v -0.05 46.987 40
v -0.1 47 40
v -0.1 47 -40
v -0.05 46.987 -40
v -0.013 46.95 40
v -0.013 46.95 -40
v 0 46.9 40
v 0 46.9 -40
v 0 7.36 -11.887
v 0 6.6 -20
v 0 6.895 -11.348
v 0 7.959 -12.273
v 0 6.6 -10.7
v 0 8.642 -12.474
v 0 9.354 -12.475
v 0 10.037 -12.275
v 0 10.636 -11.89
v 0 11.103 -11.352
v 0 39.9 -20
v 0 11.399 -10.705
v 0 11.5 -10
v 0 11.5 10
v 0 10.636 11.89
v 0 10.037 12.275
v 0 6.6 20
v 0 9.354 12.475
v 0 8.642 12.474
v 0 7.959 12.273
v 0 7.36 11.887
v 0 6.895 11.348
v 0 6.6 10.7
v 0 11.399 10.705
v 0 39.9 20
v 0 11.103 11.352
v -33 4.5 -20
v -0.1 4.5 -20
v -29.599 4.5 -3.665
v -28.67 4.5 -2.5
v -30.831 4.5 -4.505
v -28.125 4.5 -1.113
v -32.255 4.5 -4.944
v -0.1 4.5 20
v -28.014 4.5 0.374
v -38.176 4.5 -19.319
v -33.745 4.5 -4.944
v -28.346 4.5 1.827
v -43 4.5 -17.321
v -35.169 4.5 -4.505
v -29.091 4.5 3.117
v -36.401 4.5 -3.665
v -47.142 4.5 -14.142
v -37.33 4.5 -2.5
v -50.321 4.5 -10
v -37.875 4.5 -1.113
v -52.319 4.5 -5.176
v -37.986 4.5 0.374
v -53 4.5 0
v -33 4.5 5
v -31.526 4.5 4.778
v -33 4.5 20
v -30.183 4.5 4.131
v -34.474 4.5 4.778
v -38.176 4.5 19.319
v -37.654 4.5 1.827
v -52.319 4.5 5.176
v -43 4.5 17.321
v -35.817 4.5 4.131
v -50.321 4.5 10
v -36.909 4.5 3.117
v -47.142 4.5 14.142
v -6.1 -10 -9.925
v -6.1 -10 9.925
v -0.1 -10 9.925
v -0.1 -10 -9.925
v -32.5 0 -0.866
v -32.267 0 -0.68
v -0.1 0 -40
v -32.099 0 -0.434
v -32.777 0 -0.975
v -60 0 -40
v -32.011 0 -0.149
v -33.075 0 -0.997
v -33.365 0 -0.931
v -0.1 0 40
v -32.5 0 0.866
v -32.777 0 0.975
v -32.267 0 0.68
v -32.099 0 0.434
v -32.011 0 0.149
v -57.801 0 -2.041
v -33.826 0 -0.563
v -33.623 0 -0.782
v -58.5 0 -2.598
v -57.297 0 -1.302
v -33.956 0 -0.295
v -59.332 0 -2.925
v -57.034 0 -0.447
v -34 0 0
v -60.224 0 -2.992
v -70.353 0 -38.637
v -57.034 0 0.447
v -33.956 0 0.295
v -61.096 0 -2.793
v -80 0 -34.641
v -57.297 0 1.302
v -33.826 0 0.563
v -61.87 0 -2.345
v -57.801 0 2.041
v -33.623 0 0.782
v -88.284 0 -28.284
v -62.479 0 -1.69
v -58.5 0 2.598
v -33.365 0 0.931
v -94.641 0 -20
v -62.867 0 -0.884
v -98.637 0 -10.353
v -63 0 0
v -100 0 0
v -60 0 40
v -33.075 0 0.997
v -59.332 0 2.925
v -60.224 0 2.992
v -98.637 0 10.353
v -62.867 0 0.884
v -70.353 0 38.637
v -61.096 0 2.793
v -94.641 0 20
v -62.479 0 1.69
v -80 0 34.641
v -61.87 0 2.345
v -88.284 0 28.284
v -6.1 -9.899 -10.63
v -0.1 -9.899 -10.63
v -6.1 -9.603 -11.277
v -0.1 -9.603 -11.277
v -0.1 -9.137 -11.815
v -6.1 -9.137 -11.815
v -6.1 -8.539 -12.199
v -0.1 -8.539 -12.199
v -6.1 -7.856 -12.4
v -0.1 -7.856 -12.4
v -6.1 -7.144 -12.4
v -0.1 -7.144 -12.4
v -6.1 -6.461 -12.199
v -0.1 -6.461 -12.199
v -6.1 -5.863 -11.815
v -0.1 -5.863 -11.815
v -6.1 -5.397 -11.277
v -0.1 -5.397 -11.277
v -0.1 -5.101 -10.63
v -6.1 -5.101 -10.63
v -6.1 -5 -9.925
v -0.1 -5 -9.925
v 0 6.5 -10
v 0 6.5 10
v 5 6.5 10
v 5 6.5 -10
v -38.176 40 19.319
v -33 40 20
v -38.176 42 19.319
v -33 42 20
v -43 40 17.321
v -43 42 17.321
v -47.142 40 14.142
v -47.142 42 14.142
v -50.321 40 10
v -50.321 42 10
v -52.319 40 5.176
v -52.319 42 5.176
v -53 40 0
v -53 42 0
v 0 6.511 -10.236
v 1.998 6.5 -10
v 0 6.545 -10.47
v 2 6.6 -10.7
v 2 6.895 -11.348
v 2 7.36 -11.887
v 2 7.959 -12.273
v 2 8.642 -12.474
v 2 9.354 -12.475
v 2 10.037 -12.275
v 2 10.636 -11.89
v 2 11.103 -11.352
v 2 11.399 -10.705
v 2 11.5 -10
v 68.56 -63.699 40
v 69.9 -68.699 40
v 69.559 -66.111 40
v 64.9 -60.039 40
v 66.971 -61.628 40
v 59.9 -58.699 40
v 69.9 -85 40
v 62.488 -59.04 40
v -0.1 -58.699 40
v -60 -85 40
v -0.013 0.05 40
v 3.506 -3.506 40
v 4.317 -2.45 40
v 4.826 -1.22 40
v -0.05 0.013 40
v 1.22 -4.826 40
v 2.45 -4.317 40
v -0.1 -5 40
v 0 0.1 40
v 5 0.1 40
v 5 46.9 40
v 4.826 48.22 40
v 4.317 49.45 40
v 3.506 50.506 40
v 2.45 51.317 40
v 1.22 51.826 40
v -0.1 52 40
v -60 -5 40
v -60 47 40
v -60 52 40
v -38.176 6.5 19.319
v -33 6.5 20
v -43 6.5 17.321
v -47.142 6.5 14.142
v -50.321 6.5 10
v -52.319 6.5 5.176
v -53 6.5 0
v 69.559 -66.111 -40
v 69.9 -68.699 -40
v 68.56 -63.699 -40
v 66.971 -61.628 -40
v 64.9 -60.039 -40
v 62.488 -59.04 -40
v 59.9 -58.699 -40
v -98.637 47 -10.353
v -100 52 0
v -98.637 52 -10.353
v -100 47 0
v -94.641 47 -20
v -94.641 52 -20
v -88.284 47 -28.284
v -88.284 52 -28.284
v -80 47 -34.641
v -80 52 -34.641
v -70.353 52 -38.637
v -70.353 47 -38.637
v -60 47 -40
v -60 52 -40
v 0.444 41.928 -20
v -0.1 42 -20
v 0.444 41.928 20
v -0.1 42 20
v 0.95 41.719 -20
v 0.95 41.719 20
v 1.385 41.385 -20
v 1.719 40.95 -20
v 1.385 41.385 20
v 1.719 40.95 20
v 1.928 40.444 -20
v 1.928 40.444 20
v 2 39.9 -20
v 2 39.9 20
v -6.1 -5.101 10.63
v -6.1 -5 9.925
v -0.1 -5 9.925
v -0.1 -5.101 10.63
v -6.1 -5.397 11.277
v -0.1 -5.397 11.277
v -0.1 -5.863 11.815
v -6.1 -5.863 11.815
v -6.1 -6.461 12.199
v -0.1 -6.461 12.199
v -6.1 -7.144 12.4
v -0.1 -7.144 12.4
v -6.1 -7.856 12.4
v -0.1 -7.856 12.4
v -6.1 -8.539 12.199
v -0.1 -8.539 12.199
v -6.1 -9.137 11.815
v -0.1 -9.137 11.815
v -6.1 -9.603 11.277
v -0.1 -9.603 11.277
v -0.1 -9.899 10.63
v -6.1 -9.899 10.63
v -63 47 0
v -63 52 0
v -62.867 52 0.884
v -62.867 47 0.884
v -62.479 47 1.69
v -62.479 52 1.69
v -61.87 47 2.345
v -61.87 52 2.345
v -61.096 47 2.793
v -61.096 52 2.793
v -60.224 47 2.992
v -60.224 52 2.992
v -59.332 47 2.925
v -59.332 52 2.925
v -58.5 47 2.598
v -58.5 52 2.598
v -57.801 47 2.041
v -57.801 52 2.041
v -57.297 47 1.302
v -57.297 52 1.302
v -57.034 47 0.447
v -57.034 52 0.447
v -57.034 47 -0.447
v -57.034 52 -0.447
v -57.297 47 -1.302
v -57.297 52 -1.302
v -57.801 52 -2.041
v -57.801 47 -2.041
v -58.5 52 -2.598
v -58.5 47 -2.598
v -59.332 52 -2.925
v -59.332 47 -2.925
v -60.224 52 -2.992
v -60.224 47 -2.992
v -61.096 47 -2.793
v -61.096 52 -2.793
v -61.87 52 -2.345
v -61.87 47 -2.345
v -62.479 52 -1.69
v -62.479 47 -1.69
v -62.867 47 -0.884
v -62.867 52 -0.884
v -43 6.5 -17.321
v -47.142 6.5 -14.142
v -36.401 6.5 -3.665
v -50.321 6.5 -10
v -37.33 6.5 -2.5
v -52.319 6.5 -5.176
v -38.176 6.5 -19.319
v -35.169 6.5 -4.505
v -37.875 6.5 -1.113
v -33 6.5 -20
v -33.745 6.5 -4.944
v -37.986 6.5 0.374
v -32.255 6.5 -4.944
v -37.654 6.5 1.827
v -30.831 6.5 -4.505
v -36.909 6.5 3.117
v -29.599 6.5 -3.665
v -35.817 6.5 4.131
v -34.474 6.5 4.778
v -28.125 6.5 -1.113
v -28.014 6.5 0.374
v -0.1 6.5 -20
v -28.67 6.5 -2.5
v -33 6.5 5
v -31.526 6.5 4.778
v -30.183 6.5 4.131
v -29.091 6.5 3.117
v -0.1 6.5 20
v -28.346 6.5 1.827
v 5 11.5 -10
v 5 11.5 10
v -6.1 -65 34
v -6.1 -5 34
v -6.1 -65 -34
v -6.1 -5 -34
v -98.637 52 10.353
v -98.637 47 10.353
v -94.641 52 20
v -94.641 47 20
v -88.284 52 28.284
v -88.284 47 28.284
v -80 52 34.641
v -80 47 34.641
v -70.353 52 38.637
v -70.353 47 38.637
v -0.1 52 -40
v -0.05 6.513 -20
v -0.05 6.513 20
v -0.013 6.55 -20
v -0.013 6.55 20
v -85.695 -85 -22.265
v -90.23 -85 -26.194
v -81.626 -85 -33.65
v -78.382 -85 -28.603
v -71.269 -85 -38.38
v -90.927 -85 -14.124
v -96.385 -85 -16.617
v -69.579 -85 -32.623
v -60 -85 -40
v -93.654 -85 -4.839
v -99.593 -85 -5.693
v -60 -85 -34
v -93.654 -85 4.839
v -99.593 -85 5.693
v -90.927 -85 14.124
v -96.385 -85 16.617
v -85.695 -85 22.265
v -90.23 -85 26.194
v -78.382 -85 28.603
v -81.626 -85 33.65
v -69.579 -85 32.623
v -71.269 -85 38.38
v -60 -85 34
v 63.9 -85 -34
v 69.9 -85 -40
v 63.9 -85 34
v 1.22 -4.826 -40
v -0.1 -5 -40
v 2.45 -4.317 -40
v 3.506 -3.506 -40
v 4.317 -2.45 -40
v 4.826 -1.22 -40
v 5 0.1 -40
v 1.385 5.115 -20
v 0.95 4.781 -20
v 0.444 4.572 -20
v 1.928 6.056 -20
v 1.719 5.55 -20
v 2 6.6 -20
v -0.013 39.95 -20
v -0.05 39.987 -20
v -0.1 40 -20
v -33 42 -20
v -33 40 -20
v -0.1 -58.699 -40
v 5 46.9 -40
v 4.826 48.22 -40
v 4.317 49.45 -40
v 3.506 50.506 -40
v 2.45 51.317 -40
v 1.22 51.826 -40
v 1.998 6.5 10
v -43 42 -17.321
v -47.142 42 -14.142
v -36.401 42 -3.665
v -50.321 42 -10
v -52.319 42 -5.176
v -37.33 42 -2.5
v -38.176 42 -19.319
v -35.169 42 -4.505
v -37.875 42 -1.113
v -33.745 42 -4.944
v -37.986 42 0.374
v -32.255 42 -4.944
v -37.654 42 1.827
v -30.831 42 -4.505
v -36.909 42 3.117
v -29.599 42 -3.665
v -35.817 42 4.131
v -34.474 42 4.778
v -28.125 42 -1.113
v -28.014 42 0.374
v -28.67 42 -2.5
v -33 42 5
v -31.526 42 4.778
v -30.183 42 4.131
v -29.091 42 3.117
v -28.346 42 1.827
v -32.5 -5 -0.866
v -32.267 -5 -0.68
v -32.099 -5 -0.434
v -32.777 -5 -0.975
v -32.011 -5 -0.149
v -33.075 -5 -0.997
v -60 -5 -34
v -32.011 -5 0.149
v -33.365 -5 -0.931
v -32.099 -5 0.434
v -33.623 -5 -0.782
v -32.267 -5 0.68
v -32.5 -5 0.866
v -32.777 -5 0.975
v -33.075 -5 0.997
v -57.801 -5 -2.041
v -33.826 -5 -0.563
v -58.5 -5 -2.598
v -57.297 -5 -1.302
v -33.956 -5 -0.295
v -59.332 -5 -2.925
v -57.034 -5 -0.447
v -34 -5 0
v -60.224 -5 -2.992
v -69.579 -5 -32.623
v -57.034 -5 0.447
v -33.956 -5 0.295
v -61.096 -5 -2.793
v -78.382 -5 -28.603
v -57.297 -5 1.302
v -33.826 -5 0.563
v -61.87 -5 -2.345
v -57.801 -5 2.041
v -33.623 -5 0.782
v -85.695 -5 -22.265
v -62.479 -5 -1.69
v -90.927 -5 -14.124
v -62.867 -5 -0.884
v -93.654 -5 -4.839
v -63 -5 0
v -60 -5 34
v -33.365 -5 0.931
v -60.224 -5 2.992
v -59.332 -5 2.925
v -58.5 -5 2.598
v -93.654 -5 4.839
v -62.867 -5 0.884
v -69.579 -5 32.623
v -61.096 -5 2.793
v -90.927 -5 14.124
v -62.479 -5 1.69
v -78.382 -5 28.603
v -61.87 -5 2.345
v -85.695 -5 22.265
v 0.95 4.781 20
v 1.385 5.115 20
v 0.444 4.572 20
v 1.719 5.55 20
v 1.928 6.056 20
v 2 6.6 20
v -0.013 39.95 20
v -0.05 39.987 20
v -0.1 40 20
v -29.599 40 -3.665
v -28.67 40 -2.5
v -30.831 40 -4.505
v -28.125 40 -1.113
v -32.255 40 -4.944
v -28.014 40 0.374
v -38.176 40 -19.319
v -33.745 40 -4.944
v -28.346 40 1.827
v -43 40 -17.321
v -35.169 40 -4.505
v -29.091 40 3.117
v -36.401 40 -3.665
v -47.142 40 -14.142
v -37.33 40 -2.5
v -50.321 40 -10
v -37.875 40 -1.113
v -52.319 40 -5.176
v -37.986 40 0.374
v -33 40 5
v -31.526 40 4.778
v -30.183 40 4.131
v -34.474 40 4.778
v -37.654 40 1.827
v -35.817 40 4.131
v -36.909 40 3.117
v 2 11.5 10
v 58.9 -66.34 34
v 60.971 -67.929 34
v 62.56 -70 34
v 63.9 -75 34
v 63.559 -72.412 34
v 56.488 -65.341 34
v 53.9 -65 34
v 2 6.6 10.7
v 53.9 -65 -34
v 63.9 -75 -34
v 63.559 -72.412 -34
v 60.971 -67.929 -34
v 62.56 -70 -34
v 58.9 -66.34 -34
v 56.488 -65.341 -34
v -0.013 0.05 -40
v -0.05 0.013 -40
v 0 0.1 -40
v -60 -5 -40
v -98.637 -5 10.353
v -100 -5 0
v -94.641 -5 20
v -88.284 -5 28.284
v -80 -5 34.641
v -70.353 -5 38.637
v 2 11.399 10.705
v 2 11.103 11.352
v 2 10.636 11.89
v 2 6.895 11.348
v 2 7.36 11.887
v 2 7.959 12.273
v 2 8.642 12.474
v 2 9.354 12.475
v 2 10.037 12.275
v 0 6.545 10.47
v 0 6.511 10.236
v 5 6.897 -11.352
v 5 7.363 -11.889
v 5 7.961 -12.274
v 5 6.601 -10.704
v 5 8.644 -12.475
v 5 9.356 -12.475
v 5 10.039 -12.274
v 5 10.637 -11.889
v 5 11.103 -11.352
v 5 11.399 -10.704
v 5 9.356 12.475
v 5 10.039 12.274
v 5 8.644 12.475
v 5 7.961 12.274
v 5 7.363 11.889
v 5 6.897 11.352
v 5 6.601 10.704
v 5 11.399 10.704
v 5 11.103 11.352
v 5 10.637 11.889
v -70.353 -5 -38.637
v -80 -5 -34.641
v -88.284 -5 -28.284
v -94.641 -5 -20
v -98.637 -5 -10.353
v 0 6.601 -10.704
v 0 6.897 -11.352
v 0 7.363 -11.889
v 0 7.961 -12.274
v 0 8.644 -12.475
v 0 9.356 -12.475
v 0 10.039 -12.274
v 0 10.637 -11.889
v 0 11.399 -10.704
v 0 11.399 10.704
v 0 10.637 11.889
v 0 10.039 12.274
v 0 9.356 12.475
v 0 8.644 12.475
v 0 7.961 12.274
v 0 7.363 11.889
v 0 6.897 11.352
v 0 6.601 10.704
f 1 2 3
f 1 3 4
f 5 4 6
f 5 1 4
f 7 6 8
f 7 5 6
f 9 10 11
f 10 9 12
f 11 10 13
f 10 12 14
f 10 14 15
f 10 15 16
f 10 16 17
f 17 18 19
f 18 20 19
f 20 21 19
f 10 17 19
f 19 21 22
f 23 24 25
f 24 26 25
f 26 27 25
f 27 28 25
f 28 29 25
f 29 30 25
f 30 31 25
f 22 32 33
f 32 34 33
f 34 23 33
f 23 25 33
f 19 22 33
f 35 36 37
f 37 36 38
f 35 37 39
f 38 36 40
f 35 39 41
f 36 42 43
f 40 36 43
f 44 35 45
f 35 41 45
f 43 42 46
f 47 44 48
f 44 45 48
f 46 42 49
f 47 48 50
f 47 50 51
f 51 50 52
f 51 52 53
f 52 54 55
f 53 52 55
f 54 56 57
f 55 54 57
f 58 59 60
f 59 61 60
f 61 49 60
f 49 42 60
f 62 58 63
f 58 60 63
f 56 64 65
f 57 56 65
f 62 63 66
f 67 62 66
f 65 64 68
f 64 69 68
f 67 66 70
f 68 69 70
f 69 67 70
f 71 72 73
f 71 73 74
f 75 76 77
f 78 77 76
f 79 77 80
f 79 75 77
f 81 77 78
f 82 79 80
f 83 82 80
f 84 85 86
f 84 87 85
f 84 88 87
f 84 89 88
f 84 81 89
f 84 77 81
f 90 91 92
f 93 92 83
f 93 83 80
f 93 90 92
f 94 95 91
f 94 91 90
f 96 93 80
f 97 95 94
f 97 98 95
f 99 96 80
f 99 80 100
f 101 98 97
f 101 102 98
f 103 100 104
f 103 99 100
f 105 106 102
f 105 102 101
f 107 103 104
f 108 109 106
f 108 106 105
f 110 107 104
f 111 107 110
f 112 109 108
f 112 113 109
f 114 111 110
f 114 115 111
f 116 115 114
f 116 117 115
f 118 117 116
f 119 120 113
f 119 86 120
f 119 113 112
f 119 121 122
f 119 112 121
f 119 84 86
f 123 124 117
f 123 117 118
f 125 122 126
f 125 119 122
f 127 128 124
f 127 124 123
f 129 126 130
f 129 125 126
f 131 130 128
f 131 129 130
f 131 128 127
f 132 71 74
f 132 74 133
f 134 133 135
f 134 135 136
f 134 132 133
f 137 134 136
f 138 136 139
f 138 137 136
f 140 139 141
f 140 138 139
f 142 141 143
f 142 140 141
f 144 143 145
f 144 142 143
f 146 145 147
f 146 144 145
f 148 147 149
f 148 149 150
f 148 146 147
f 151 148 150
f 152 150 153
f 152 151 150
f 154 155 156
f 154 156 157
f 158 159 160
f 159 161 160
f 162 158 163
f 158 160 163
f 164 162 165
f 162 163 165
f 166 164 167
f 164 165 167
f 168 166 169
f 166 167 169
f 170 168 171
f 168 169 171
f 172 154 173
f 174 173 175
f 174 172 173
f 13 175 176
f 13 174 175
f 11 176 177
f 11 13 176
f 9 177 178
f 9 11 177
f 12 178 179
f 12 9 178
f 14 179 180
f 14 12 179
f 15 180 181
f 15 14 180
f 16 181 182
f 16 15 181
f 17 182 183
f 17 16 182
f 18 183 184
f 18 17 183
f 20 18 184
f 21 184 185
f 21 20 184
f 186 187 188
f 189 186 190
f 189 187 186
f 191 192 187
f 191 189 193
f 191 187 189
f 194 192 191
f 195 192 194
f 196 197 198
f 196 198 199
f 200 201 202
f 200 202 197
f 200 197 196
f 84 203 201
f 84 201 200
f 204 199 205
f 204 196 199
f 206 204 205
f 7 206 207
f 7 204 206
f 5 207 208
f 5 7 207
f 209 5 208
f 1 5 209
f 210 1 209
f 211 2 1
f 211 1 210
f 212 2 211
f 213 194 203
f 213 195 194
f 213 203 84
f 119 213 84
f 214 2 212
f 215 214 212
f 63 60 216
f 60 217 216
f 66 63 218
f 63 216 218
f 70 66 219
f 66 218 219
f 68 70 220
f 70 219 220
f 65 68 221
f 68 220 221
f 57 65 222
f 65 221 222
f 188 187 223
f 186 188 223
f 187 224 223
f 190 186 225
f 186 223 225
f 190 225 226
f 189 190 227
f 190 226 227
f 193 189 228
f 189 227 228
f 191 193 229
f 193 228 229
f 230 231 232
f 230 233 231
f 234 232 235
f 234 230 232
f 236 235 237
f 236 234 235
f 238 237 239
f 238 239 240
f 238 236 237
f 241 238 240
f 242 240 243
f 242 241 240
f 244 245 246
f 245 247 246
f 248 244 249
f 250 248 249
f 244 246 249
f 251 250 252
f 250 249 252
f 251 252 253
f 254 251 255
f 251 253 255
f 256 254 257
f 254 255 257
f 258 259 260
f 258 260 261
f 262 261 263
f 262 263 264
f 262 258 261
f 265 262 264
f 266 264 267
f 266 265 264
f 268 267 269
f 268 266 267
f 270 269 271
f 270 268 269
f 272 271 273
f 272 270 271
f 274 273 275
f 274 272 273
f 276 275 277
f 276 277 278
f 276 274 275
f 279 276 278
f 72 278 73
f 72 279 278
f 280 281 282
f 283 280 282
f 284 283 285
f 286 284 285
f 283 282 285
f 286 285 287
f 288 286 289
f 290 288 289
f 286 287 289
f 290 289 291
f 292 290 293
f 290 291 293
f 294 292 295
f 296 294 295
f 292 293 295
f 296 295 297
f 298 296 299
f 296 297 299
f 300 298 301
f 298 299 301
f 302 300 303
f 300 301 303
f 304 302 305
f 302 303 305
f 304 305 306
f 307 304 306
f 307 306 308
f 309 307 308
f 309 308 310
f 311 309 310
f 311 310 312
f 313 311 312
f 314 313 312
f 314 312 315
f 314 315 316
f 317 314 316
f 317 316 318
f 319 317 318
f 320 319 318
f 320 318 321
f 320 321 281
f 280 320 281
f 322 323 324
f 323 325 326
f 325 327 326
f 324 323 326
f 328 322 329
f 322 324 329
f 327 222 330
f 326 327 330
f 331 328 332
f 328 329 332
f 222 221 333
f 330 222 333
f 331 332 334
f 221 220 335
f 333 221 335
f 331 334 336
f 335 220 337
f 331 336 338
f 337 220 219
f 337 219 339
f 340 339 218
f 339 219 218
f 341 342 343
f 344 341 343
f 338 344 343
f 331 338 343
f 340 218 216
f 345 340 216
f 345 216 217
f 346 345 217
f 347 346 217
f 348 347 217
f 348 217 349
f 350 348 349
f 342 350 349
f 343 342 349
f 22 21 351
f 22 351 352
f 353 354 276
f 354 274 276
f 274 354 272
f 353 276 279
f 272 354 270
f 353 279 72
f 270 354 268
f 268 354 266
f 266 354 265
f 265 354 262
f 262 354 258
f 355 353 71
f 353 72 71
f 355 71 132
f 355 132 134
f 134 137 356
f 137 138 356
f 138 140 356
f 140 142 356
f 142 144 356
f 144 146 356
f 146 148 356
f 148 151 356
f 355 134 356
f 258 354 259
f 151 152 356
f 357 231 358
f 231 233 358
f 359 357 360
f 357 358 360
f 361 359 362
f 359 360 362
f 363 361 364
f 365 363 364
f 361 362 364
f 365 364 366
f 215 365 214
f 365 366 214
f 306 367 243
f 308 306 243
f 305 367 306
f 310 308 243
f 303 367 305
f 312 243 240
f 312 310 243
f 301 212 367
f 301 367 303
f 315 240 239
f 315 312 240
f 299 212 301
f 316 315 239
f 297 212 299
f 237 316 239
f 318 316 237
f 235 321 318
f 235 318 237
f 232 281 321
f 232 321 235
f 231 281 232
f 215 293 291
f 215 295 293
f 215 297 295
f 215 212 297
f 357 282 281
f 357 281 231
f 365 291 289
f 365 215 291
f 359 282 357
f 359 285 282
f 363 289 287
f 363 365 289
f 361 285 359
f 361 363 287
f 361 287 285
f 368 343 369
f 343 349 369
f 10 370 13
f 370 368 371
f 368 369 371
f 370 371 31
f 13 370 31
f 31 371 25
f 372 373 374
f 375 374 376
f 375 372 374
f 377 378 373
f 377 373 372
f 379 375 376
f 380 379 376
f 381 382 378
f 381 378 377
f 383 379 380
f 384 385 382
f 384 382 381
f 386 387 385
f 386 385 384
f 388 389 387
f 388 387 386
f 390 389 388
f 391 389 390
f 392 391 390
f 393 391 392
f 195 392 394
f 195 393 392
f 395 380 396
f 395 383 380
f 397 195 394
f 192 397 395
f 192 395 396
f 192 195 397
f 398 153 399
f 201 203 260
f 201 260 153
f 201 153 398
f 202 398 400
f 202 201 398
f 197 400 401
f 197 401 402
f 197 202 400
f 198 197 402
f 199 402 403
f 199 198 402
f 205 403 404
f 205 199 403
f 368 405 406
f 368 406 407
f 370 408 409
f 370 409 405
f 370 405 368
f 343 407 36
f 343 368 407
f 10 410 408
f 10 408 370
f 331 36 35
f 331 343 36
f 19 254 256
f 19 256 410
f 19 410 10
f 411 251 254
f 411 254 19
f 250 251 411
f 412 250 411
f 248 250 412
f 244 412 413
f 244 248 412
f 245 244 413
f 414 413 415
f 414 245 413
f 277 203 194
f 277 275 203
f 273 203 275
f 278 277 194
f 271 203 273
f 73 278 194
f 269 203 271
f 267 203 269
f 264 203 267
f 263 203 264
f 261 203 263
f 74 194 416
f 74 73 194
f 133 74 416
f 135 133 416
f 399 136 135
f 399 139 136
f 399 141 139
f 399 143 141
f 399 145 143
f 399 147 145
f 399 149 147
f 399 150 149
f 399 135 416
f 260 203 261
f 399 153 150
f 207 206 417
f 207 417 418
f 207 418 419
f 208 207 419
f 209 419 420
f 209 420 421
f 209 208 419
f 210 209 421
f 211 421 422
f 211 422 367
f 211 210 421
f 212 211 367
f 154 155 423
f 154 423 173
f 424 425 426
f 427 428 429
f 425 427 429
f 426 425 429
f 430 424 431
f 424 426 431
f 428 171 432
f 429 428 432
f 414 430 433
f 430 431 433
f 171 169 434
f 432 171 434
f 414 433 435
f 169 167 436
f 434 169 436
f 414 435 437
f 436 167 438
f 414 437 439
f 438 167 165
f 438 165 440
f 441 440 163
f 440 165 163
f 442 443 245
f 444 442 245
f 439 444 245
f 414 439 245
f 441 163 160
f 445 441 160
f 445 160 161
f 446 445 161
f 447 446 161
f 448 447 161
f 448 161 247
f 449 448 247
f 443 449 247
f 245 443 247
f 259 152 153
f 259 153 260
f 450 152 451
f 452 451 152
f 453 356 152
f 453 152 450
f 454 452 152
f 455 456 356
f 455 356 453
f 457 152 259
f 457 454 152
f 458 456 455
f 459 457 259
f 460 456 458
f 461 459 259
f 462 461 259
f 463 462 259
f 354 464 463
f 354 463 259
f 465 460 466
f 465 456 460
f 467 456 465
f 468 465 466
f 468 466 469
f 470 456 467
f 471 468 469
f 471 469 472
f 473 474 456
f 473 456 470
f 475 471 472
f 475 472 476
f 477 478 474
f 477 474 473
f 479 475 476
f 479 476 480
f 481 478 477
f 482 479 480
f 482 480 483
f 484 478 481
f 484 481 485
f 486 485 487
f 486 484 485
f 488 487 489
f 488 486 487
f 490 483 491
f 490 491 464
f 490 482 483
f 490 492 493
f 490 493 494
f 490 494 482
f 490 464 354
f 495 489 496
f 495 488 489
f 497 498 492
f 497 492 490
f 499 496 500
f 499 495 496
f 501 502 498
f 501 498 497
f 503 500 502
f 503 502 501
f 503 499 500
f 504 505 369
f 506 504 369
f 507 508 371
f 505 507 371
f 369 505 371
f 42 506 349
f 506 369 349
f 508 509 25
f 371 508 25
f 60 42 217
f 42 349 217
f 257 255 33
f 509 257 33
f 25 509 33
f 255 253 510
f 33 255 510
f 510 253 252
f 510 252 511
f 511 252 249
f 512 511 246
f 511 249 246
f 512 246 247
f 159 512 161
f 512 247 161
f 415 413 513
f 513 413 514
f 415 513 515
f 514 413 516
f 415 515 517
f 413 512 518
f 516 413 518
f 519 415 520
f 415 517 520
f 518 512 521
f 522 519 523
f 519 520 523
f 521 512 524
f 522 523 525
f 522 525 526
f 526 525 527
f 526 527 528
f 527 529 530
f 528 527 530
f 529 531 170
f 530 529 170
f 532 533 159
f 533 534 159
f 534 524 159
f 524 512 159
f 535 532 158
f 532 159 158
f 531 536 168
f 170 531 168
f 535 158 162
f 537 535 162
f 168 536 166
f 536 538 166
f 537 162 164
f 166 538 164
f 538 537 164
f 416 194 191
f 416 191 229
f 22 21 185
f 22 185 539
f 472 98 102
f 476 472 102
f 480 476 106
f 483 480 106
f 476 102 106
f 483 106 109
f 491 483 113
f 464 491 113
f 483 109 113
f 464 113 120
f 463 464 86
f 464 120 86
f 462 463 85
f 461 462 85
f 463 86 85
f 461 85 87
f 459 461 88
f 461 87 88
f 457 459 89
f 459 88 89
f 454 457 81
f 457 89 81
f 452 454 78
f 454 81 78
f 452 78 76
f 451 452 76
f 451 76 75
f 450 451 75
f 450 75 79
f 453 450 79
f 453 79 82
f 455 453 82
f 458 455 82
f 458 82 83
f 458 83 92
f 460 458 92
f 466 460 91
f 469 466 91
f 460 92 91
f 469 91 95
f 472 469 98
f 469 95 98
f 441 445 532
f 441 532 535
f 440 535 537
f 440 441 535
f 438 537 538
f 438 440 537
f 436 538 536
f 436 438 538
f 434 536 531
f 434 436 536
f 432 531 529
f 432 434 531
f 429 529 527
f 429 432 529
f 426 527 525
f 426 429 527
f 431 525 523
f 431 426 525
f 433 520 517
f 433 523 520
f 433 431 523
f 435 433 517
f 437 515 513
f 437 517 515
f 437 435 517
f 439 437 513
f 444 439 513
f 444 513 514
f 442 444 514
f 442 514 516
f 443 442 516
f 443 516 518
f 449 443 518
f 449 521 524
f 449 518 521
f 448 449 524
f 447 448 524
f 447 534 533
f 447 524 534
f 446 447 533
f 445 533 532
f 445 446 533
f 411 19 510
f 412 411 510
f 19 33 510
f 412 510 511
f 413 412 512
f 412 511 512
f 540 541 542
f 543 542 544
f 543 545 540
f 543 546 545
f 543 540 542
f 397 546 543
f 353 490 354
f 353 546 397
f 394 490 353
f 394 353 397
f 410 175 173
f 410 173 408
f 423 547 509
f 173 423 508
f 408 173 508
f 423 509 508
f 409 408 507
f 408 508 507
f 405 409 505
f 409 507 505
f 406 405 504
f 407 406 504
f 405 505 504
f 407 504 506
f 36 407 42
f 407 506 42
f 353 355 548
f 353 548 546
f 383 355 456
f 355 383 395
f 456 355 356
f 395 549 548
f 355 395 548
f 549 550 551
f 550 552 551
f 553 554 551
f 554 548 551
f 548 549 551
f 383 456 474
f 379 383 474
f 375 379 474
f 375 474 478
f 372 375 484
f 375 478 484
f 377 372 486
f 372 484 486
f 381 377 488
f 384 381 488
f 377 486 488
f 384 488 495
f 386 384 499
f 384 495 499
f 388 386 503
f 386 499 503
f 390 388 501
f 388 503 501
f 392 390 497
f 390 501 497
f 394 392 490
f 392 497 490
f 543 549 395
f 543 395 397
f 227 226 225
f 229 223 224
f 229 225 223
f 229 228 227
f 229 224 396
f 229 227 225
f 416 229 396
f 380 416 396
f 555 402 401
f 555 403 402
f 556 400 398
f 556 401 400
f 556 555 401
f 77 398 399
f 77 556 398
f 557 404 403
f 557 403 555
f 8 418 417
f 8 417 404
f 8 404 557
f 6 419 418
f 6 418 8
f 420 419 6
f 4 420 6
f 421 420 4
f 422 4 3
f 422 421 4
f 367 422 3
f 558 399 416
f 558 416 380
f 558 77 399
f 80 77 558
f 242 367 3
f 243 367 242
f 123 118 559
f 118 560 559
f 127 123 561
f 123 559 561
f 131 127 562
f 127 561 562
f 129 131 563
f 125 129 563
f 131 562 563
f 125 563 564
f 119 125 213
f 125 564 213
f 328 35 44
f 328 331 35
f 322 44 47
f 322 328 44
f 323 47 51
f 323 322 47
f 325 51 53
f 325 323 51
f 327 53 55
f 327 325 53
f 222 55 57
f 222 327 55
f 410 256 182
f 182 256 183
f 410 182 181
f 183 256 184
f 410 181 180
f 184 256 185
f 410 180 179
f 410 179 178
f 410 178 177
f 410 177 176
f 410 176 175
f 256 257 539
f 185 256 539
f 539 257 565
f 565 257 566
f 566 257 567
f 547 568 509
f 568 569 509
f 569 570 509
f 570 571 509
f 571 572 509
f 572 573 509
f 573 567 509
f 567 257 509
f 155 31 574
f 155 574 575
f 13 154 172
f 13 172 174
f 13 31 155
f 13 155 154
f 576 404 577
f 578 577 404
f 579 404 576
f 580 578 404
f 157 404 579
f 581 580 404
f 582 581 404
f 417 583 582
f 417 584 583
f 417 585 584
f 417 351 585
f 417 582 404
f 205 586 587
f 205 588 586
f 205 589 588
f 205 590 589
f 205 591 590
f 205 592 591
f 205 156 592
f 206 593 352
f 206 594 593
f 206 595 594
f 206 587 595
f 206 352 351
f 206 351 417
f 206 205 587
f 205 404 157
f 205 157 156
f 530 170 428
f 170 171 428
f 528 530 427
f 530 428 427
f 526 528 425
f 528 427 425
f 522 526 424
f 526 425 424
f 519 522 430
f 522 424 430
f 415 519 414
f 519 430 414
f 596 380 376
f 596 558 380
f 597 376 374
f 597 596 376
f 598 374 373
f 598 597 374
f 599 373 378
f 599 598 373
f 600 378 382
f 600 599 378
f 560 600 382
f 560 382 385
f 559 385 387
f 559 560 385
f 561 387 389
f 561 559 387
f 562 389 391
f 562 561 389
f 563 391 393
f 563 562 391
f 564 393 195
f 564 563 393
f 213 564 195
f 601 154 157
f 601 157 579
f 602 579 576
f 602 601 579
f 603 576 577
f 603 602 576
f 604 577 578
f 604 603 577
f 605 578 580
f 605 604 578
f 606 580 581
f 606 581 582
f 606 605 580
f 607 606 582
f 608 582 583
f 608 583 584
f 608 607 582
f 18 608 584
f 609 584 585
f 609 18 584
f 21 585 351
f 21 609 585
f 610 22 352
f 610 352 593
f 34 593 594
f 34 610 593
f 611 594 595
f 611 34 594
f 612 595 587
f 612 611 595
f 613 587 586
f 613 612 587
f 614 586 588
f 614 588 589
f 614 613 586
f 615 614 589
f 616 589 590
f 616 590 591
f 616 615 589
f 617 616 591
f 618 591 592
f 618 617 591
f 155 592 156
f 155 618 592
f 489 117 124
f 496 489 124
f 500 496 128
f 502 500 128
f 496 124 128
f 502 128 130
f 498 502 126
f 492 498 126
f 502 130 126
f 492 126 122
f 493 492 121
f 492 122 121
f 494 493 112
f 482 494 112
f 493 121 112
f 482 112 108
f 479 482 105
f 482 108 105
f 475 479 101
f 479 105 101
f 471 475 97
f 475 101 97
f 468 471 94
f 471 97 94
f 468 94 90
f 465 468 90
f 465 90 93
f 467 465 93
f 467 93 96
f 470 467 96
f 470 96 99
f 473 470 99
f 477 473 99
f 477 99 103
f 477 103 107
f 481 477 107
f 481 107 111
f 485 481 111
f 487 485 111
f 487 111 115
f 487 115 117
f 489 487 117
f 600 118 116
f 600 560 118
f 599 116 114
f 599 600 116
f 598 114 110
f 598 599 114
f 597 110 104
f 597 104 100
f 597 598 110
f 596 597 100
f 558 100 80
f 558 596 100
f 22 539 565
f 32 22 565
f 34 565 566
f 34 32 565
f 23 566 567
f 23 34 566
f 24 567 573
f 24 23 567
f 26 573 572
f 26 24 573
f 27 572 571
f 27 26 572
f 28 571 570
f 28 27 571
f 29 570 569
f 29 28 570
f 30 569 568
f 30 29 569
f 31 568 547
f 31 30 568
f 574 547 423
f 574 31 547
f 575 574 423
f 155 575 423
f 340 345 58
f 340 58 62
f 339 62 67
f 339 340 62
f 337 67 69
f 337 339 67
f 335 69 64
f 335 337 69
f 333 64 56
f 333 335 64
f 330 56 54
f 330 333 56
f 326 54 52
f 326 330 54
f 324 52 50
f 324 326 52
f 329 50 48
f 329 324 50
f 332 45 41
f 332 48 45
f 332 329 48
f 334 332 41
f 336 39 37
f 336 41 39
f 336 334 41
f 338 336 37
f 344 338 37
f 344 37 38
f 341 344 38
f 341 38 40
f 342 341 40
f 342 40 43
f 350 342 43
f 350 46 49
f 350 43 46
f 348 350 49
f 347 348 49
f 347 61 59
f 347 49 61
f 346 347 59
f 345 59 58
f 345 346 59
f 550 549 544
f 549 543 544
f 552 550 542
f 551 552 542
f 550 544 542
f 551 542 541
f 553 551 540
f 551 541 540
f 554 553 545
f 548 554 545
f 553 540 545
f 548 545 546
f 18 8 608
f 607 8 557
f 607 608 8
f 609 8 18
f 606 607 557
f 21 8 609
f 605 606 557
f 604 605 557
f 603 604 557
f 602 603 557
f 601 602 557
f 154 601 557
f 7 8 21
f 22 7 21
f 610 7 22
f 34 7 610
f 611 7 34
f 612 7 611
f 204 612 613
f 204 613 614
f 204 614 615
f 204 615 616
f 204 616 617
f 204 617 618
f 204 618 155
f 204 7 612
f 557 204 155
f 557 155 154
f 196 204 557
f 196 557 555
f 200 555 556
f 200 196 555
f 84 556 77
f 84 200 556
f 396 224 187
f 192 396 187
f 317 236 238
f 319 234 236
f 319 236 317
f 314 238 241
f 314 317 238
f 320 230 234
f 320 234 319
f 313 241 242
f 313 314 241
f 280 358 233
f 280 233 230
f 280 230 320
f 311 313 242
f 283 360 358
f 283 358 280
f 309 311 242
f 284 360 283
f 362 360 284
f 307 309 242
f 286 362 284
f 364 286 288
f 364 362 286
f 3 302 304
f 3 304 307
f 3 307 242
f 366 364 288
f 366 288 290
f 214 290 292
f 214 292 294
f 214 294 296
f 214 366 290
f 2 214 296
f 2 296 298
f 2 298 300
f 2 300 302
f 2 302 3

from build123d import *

# Parameters (mm, degrees)
BASE_FLANGE1_DEPTH      = 40
BASE_FLANGE2_DEPTH      = 20
FILLET1_R               = 20
FILLET2_R               = 40
SKETCH10_R              = 3
CUT_EXTRUDE1_DEPTH      = 122.856472951
CUT_EXTRUDE2_DEPTH      = 117.726175299
CUT_EXTRUDE2_DEPTH_BACK = 117.726175299
SKETCH13_R              = 5
EXTRUDE_THIN1_DEPTH     = 80
SKETCH15_R              = 1
CUT_EXTRUDE3_DEPTH      = 5
CUT_EXTRUDE4_START      = -11.1
CUT_EXTRUDE4_DEPTH      = 6
CUT_EXTRUDE4_START_2    = -5
CUT_EXTRUDE4_2_DEPTH    = 5
SKETCH18_W              = 68
SKETCH18_H              = 20
CUT_EXTRUDE5_DEPTH      = 6
BOSS_EXTRUDE1_DEPTH     = 70
SKETCH20_W              = 6
SKETCH20_H              = 68
BOSS_EXTRUDE2_DEPTH     = 20
FILLET3_R               = 10


# Read off the part's stored shape, not the designer's step: Cut-Extrude4
# Sheet-metal steps are written as plain solids
with BuildPart() as part:
    # Sketch2 → Base-Flange1 (new, symmetric)
    with BuildSketch(Plane.XY):
        with BuildLine():
            Line((-100, 47), (-0.1, 47))
            ThreePointArc((-0.1, 47), (-0.029289322, 46.970710678), (0, 46.9))
            Line((0, 46.9), (0, 0.1))
            ThreePointArc((0, 0.1), (-0.029289322, 0.029289322), (-0.1, 0))
            Line((-0.1, 0), (-100, 0))
            Line((-100, 0), (-100, -5))
            Line((-100, -5), (-0.1, -5))
            ThreePointArc((-0.1, -5), (3.506244584, -3.506244584), (5, 0.1))
            Line((5, 0.1), (5, 46.9))
            ThreePointArc((5, 46.9), (3.506244584, 50.506244584), (-0.1, 52))
            Line((-0.1, 52), (-100, 52))
            Line((-100, 52), (-100, 47))
        make_face()
    extrude(amount=BASE_FLANGE1_DEPTH, both=True)

    # Fillet2
    fillet2_edges = [part.edges().sort_by_distance(p)[0] for p in [
        (-100, -2.5, 40),
        (-100, -2.5, -40),
        (-100, 49.5, -40),
        (-100, 49.5, 40),
    ]]
    fillet(fillet2_edges, radius=FILLET2_R - 0.0001)  # a hair under: the kernel refuses the full size

    # Sketch10 → Cut-Extrude1 (cut, through all)
    with BuildSketch(Plane(origin=(0, 52, 0), x_dir=(1, 0, 0), z_dir=(0, 1, 0))):
        with Locations(Location((-60, 0, 0), (0, 0, 180))):
            Circle(SKETCH10_R)
    extrude(amount=-CUT_EXTRUDE1_DEPTH, mode=Mode.SUBTRACT)

    # Sketch14 → Extrude-Thin1 (add)
    with BuildSketch(Plane.XZ.offset(5)):
        with BuildLine():
            Line((-60, 40), (-0.1, 40))
            Line((-0.1, 40), (-0.1, -40))
            Line((-0.1, -40), (-60, -40))
            ThreePointArc((-60, -40), (-100, 0), (-60, 40))
        make_face()
        with BuildLine():
            Line((-60, 34), (-6.1, 34))
            Line((-6.1, 34), (-6.1, -34))
            Line((-6.1, -34), (-60, -34))
            ThreePointArc((-60, -34), (-94, 0), (-60, 34))
        make_face(mode=Mode.SUBTRACT)
    extrude(amount=EXTRUDE_THIN1_DEPTH)

    # Sketch15 → Cut-Extrude3 (cut)
    with BuildSketch(Plane(origin=(0, 0, 0), x_dir=(1, 0, 0), z_dir=(0, 1, 0))):
        with Locations(Location((-33, 0, 0), (0, 0, 180))):
            Circle(SKETCH15_R)
    extrude(amount=-CUT_EXTRUDE3_DEPTH, mode=Mode.SUBTRACT)

    # Cut-Extrude4 outline → Cut-Extrude4 (cut)
    with BuildSketch(Plane(origin=(5, 0, 0), x_dir=(0, 0, -1), z_dir=(1, 0, 0)).offset(CUT_EXTRUDE4_START)):
        with BuildLine():
            ThreePointArc((-9.925361454, -5), (-12.425361454, -7.5), (-9.925361454, -10))
            Line((-9.925361454, -10), (9.925361454, -10))
            ThreePointArc((9.925361454, -10), (12.425361454, -7.5), (9.925361454, -5))
            Line((9.925361454, -5), (-9.925361454, -5))
        make_face()
    extrude(amount=CUT_EXTRUDE4_DEPTH, mode=Mode.SUBTRACT)


with BuildPart() as body_2:
    # Sketch7 → Base-Flange2 (new, symmetric)
    with BuildSketch(Plane.XY):
        with BuildLine():
            Line((-53, 6.5), (-0.1, 6.5))
            ThreePointArc((-0.1, 6.5), (-0.029289322, 6.529289322), (0, 6.6))
            Line((0, 6.6), (0, 39.9))
            ThreePointArc((0, 39.9), (-0.029289322, 39.970710678), (-0.1, 40))
            Line((-0.1, 40), (-53, 40))
            Line((-53, 40), (-53, 42))
            Line((-53, 42), (-0.1, 42))
            ThreePointArc((-0.1, 42), (1.38492424, 41.38492424), (2, 39.9))
            Line((2, 39.9), (2, 6.6))
            ThreePointArc((2, 6.6), (1.38492424, 5.11507576), (-0.1, 4.5))
            Line((-0.1, 4.5), (-53, 4.5))
            Line((-53, 4.5), (-53, 6.5))
        make_face()
    extrude(amount=BASE_FLANGE2_DEPTH, both=True)

    # Fillet1
    fillet1_edges = [body_2.edges().sort_by_distance(p)[0] for p in [
        (-53, 5.5, -20),
        (-53, 5.5, 20),
        (-53, 41, 20),
        (-53, 41, -20),
    ]]
    fillet(fillet1_edges, radius=FILLET1_R - 0.0001)  # a hair under: the kernel refuses the full size

    # Sketch13 → Cut-Extrude2 (cut, two sides: drawn at the far end of the back side and taken through both)
    with BuildSketch(Plane.XZ.offset(-40).offset(-CUT_EXTRUDE2_DEPTH_BACK)):
        with Locations(Location((-33, 0, 0), (0, 0, 90))):
            Circle(SKETCH13_R)
    extrude(amount=CUT_EXTRUDE2_DEPTH + CUT_EXTRUDE2_DEPTH_BACK, mode=Mode.SUBTRACT)


with BuildPart() as cut_extrude4_2_tool:
    # Cut-Extrude4 2 outline → Cut-Extrude4 2 (new body)
    with BuildSketch(Plane(origin=(5, 0, 0), x_dir=(0, 0, -1), z_dir=(1, 0, 0)).offset(CUT_EXTRUDE4_START_2)):
        with BuildLine():
            ThreePointArc((-10, 11.5), (-12.5, 9), (-10, 6.5))
            Line((-10, 6.5), (10, 6.5))
            ThreePointArc((10, 6.5), (12.5, 9), (10, 11.5))
            Line((10, 11.5), (-10, 11.5))
        make_face()
    extrude(amount=CUT_EXTRUDE4_2_DEPTH)


with BuildPart() as part_1:
    add(part.part)

    # Cut-Extrude4 2: cut by cut_extrude4_2_tool
    add(cut_extrude4_2_tool.part, mode=Mode.SUBTRACT)

    # Sketch18 → Cut-Extrude5 (cut)
    with BuildSketch(Plane(origin=(-0.1, 0, 0), x_dir=(0, 0, -1), z_dir=(1, 0, 0))):
        with Locations((0, -75)):
            Rectangle(SKETCH18_W, SKETCH18_H)
    extrude(amount=-CUT_EXTRUDE5_DEPTH, mode=Mode.SUBTRACT)

    # Sketch19 → Boss-Extrude1 (add)
    with BuildSketch(Plane(origin=(-0.1, 0, 0), x_dir=(0, 0, -1), z_dir=(1, 0, 0))):
        Polygon((-34, -85), (-40, -85), (-40, -58.699138256), (40, -58.699138256), (40, -85), (34, -85), (34, -65), (-34, -65), align=None)
    extrude(amount=BOSS_EXTRUDE1_DEPTH)

    # Sketch20 → Boss-Extrude2 (add)
    with BuildSketch(Plane.XZ.offset(65)):
        with Locations((66.9, 0)):
            Rectangle(SKETCH20_W, SKETCH20_H)
    extrude(amount=BOSS_EXTRUDE2_DEPTH)

    # Fillet3
    fillet3_edges = [part_1.edges().sort_by_distance(p)[0] for p in [
        (69.9, -58.699138256, 0),
        (63.9, -65, 0),
    ]]
    fillet(fillet3_edges, radius=FILLET3_R)


with BuildPart() as body_2_1:
    add(body_2.part)

    # Cut-Extrude4 2: cut by cut_extrude4_2_tool
    add(cut_extrude4_2_tool.part, mode=Mode.SUBTRACT)


solid = Compound([part_1.part, body_2_1.part])
